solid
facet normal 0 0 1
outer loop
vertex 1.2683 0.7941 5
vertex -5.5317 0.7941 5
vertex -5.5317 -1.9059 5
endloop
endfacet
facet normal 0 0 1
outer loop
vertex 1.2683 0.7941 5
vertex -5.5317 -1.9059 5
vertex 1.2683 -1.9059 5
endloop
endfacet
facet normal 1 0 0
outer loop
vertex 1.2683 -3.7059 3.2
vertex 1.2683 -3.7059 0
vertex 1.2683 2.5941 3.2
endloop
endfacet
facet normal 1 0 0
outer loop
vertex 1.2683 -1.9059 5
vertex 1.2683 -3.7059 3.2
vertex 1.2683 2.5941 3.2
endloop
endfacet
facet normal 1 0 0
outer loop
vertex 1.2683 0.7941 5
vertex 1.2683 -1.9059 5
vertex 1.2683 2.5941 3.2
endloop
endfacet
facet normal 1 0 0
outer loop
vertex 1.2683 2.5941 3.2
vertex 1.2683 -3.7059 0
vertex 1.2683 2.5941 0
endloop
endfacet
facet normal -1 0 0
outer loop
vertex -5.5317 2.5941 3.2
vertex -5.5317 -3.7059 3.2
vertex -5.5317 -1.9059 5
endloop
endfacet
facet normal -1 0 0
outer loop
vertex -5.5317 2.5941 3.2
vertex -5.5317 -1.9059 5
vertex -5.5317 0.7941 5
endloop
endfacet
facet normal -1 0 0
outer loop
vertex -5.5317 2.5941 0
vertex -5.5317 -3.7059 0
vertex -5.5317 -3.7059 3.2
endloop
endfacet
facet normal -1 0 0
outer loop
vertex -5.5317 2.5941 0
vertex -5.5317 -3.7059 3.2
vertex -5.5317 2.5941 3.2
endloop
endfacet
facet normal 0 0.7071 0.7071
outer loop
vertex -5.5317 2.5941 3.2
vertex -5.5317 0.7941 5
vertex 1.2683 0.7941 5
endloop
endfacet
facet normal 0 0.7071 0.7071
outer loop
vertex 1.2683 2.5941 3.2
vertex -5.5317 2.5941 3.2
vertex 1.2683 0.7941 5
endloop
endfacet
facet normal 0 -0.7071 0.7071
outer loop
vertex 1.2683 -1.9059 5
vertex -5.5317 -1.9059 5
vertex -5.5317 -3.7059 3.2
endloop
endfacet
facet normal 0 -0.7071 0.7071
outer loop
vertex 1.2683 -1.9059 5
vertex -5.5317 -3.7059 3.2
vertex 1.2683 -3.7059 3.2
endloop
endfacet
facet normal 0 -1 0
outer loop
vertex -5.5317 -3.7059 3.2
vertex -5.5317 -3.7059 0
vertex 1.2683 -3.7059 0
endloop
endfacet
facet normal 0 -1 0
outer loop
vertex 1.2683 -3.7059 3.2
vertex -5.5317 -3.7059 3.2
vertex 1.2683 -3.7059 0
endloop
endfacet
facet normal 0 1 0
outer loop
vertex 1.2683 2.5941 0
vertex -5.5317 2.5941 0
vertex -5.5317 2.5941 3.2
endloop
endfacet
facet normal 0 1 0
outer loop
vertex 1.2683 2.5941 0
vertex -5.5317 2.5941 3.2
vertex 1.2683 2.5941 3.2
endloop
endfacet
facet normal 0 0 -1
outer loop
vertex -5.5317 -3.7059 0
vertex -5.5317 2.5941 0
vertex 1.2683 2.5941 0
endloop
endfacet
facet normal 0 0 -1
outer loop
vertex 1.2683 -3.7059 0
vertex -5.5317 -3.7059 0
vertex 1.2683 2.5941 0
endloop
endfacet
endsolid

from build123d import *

# Parameters (mm, degrees)
SKETCH_1_W      = 6.8
SKETCH_1_H      = 6.3
EXTRUDE_1_DEPTH = 5
CHAMFER_1_SIZE  = 1.8


with BuildPart() as part:
    # 草图1 → 凸台-拉伸1 (new body)
    with BuildSketch(Plane.XY):
        with Locations((-2.131657577, -0.555911138)):
            Rectangle(SKETCH_1_W, SKETCH_1_H)
    extrude(amount=EXTRUDE_1_DEPTH)

    # 倒角1
    chamfer_1_edges = [part.edges().sort_by_distance(p)[0] for p in [
        (-2.131657577, 2.594088862, 5),
        (-2.131657577, -3.705911138, 5),
    ]]
    chamfer(chamfer_1_edges, length=CHAMFER_1_SIZE)


solid = part.part
